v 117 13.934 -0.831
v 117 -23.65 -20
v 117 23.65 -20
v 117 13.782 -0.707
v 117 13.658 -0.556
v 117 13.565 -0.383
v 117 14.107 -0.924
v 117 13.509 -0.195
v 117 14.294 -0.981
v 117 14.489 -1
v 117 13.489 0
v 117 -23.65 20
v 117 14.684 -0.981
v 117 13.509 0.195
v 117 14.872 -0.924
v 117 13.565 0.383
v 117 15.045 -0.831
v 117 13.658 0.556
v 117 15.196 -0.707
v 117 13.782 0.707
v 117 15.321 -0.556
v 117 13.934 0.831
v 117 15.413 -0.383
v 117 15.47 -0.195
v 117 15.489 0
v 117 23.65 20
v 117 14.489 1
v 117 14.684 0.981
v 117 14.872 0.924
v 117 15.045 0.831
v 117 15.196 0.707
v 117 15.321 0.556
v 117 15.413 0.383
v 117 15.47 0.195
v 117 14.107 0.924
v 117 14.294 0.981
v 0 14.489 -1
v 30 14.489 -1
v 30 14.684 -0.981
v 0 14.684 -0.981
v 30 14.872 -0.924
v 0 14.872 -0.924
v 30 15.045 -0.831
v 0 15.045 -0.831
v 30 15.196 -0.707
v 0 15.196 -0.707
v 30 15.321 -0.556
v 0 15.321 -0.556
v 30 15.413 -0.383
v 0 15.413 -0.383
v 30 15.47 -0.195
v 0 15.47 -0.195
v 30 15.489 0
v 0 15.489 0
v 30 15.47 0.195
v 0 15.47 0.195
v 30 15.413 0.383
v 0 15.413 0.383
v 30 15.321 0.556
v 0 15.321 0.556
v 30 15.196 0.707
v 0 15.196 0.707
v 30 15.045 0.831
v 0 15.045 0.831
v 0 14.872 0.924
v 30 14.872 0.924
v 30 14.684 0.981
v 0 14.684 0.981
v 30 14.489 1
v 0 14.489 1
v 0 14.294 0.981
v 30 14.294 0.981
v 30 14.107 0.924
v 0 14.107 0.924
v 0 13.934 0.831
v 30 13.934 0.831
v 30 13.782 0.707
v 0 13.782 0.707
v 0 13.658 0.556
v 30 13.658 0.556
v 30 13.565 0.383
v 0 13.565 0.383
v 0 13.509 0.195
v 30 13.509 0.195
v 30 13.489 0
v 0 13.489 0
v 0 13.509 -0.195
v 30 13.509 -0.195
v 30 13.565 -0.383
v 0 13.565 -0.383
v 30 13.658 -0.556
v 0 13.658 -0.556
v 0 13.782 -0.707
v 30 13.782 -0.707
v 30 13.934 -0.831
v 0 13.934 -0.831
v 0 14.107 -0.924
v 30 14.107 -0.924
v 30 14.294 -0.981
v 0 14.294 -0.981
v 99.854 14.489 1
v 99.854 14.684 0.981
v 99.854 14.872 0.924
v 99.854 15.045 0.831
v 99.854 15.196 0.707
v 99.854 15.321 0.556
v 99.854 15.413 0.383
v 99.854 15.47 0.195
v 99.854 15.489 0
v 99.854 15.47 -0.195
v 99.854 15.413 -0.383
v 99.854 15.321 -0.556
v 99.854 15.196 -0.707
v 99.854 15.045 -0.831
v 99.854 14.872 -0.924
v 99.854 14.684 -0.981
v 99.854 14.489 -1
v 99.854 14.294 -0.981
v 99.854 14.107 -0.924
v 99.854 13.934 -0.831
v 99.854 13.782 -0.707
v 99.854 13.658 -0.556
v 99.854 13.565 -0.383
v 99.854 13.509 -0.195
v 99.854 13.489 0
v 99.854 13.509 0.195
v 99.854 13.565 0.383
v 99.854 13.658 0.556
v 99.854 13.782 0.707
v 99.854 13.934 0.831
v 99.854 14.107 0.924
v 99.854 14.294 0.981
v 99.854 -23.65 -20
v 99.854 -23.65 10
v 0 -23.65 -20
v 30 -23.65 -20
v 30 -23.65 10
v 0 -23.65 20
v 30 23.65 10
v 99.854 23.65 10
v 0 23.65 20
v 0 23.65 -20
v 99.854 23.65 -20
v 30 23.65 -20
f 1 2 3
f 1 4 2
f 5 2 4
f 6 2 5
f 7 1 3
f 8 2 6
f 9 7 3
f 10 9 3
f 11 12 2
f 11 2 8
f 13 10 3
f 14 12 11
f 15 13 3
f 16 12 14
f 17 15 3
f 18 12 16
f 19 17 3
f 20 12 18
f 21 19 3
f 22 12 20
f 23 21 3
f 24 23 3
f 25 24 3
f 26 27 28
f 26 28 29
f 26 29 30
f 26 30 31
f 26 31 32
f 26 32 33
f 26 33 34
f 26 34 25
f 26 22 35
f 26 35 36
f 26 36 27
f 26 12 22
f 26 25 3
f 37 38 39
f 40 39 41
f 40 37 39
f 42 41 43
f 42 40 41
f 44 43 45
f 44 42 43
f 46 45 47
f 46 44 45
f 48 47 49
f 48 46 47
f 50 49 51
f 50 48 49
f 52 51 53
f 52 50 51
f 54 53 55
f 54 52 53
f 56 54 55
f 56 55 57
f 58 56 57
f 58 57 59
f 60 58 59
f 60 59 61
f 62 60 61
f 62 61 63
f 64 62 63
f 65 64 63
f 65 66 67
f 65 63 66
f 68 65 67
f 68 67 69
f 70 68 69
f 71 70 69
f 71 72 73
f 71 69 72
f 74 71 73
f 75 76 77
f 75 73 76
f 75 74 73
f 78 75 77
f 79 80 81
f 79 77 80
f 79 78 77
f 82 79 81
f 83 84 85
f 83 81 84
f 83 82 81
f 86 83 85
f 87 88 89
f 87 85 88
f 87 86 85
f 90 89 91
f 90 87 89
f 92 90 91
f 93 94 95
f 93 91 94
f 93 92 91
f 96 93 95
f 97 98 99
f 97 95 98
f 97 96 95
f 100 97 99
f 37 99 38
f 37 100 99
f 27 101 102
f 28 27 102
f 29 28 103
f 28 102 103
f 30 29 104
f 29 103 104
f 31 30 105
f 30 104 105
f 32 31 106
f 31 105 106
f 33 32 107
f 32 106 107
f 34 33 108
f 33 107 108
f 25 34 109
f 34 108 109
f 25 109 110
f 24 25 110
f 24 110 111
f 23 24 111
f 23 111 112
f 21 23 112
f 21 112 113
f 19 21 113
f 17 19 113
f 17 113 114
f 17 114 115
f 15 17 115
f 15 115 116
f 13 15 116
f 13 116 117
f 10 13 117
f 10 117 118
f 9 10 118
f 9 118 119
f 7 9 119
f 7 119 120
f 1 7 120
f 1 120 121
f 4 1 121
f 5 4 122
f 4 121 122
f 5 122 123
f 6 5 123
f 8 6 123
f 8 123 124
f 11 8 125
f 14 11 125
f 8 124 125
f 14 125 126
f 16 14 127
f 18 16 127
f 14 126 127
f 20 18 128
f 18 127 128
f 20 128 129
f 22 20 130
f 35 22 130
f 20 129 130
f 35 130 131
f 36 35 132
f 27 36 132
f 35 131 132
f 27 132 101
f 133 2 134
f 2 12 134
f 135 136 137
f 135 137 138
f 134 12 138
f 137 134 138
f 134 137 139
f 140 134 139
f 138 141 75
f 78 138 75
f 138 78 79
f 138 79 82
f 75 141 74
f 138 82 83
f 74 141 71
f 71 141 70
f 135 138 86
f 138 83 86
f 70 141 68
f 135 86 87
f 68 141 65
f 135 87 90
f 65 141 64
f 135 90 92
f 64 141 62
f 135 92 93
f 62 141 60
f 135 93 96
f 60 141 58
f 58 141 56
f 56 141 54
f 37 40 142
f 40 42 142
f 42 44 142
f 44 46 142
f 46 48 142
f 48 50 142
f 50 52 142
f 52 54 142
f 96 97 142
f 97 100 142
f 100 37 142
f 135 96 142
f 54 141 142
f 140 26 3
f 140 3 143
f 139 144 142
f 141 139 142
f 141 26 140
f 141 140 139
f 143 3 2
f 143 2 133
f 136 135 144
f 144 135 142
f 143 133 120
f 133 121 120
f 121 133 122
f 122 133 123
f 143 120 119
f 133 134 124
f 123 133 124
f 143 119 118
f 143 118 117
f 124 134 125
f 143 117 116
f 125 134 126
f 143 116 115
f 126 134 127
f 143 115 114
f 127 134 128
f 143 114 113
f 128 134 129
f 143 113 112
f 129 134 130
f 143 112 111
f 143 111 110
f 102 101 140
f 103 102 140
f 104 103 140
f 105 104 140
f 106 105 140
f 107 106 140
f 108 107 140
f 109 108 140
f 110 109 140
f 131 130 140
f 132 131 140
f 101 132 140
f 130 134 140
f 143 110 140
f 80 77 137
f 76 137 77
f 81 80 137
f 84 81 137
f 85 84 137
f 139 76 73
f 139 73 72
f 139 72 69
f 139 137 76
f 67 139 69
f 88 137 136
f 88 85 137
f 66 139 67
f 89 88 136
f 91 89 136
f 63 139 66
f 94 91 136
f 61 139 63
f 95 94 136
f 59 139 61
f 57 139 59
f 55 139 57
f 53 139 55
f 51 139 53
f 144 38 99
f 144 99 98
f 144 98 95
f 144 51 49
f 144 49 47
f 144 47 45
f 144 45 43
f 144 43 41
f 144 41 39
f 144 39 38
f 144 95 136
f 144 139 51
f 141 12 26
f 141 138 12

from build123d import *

# Parameters (mm, degrees)
CROQUIS1_W              = 40
CROQUIS1_H              = 47.3
CROQUIS1_R              = 1
SALIENTE_EXTRUIR1_DEPTH = 30
CROQUIS2_W              = 10
CROQUIS2_H              = 47.3
SALIENTE_EXTRUIR2_DEPTH = 87
CROQUIS3_W              = 17.14601676
CROQUIS3_H              = 47.3
SALIENTE_EXTRUIR3_DEPTH = 30
CROQUIS4_R              = 1
CORTAR_EXTRUIR1_DEPTH   = 118


with BuildPart() as part:
    # Croquis1 → Saliente-Extruir1 (new body)
    with BuildSketch(Plane(origin=(0, 0, 0), x_dir=(0, 0, -1), z_dir=(1, 0, 0))):
        Rectangle(CROQUIS1_W, CROQUIS1_H)
        with Locations((0, 14.489311164)):
            Circle(CROQUIS1_R, mode=Mode.SUBTRACT)
    extrude(amount=SALIENTE_EXTRUIR1_DEPTH)

    # Croquis2 → Saliente-Extruir2 (add)
    with BuildSketch(Plane(origin=(30, 0, 0), x_dir=(0, 0, -1), z_dir=(1, 0, 0))):
        with Locations((-15, 0)):
            Rectangle(CROQUIS2_W, CROQUIS2_H)
    extrude(amount=SALIENTE_EXTRUIR2_DEPTH)

    # Croquis3 → Saliente-Extruir3 (add)
    with BuildSketch(Plane(origin=(0, 0, 10), x_dir=(-1, 0, 0), z_dir=(0, 0, -1))):
        with Locations((-108.42699162, 0)):
            Rectangle(CROQUIS3_W, CROQUIS3_H)
    extrude(amount=SALIENTE_EXTRUIR3_DEPTH)

    # Croquis4 → Cortar-Extruir1 (cut, through all)
    with BuildSketch(Plane.ZY):
        with Locations((0, 14.489311164)):
            Circle(CROQUIS4_R)
    extrude(amount=-CORTAR_EXTRUIR1_DEPTH, mode=Mode.SUBTRACT)


solid = part.part
